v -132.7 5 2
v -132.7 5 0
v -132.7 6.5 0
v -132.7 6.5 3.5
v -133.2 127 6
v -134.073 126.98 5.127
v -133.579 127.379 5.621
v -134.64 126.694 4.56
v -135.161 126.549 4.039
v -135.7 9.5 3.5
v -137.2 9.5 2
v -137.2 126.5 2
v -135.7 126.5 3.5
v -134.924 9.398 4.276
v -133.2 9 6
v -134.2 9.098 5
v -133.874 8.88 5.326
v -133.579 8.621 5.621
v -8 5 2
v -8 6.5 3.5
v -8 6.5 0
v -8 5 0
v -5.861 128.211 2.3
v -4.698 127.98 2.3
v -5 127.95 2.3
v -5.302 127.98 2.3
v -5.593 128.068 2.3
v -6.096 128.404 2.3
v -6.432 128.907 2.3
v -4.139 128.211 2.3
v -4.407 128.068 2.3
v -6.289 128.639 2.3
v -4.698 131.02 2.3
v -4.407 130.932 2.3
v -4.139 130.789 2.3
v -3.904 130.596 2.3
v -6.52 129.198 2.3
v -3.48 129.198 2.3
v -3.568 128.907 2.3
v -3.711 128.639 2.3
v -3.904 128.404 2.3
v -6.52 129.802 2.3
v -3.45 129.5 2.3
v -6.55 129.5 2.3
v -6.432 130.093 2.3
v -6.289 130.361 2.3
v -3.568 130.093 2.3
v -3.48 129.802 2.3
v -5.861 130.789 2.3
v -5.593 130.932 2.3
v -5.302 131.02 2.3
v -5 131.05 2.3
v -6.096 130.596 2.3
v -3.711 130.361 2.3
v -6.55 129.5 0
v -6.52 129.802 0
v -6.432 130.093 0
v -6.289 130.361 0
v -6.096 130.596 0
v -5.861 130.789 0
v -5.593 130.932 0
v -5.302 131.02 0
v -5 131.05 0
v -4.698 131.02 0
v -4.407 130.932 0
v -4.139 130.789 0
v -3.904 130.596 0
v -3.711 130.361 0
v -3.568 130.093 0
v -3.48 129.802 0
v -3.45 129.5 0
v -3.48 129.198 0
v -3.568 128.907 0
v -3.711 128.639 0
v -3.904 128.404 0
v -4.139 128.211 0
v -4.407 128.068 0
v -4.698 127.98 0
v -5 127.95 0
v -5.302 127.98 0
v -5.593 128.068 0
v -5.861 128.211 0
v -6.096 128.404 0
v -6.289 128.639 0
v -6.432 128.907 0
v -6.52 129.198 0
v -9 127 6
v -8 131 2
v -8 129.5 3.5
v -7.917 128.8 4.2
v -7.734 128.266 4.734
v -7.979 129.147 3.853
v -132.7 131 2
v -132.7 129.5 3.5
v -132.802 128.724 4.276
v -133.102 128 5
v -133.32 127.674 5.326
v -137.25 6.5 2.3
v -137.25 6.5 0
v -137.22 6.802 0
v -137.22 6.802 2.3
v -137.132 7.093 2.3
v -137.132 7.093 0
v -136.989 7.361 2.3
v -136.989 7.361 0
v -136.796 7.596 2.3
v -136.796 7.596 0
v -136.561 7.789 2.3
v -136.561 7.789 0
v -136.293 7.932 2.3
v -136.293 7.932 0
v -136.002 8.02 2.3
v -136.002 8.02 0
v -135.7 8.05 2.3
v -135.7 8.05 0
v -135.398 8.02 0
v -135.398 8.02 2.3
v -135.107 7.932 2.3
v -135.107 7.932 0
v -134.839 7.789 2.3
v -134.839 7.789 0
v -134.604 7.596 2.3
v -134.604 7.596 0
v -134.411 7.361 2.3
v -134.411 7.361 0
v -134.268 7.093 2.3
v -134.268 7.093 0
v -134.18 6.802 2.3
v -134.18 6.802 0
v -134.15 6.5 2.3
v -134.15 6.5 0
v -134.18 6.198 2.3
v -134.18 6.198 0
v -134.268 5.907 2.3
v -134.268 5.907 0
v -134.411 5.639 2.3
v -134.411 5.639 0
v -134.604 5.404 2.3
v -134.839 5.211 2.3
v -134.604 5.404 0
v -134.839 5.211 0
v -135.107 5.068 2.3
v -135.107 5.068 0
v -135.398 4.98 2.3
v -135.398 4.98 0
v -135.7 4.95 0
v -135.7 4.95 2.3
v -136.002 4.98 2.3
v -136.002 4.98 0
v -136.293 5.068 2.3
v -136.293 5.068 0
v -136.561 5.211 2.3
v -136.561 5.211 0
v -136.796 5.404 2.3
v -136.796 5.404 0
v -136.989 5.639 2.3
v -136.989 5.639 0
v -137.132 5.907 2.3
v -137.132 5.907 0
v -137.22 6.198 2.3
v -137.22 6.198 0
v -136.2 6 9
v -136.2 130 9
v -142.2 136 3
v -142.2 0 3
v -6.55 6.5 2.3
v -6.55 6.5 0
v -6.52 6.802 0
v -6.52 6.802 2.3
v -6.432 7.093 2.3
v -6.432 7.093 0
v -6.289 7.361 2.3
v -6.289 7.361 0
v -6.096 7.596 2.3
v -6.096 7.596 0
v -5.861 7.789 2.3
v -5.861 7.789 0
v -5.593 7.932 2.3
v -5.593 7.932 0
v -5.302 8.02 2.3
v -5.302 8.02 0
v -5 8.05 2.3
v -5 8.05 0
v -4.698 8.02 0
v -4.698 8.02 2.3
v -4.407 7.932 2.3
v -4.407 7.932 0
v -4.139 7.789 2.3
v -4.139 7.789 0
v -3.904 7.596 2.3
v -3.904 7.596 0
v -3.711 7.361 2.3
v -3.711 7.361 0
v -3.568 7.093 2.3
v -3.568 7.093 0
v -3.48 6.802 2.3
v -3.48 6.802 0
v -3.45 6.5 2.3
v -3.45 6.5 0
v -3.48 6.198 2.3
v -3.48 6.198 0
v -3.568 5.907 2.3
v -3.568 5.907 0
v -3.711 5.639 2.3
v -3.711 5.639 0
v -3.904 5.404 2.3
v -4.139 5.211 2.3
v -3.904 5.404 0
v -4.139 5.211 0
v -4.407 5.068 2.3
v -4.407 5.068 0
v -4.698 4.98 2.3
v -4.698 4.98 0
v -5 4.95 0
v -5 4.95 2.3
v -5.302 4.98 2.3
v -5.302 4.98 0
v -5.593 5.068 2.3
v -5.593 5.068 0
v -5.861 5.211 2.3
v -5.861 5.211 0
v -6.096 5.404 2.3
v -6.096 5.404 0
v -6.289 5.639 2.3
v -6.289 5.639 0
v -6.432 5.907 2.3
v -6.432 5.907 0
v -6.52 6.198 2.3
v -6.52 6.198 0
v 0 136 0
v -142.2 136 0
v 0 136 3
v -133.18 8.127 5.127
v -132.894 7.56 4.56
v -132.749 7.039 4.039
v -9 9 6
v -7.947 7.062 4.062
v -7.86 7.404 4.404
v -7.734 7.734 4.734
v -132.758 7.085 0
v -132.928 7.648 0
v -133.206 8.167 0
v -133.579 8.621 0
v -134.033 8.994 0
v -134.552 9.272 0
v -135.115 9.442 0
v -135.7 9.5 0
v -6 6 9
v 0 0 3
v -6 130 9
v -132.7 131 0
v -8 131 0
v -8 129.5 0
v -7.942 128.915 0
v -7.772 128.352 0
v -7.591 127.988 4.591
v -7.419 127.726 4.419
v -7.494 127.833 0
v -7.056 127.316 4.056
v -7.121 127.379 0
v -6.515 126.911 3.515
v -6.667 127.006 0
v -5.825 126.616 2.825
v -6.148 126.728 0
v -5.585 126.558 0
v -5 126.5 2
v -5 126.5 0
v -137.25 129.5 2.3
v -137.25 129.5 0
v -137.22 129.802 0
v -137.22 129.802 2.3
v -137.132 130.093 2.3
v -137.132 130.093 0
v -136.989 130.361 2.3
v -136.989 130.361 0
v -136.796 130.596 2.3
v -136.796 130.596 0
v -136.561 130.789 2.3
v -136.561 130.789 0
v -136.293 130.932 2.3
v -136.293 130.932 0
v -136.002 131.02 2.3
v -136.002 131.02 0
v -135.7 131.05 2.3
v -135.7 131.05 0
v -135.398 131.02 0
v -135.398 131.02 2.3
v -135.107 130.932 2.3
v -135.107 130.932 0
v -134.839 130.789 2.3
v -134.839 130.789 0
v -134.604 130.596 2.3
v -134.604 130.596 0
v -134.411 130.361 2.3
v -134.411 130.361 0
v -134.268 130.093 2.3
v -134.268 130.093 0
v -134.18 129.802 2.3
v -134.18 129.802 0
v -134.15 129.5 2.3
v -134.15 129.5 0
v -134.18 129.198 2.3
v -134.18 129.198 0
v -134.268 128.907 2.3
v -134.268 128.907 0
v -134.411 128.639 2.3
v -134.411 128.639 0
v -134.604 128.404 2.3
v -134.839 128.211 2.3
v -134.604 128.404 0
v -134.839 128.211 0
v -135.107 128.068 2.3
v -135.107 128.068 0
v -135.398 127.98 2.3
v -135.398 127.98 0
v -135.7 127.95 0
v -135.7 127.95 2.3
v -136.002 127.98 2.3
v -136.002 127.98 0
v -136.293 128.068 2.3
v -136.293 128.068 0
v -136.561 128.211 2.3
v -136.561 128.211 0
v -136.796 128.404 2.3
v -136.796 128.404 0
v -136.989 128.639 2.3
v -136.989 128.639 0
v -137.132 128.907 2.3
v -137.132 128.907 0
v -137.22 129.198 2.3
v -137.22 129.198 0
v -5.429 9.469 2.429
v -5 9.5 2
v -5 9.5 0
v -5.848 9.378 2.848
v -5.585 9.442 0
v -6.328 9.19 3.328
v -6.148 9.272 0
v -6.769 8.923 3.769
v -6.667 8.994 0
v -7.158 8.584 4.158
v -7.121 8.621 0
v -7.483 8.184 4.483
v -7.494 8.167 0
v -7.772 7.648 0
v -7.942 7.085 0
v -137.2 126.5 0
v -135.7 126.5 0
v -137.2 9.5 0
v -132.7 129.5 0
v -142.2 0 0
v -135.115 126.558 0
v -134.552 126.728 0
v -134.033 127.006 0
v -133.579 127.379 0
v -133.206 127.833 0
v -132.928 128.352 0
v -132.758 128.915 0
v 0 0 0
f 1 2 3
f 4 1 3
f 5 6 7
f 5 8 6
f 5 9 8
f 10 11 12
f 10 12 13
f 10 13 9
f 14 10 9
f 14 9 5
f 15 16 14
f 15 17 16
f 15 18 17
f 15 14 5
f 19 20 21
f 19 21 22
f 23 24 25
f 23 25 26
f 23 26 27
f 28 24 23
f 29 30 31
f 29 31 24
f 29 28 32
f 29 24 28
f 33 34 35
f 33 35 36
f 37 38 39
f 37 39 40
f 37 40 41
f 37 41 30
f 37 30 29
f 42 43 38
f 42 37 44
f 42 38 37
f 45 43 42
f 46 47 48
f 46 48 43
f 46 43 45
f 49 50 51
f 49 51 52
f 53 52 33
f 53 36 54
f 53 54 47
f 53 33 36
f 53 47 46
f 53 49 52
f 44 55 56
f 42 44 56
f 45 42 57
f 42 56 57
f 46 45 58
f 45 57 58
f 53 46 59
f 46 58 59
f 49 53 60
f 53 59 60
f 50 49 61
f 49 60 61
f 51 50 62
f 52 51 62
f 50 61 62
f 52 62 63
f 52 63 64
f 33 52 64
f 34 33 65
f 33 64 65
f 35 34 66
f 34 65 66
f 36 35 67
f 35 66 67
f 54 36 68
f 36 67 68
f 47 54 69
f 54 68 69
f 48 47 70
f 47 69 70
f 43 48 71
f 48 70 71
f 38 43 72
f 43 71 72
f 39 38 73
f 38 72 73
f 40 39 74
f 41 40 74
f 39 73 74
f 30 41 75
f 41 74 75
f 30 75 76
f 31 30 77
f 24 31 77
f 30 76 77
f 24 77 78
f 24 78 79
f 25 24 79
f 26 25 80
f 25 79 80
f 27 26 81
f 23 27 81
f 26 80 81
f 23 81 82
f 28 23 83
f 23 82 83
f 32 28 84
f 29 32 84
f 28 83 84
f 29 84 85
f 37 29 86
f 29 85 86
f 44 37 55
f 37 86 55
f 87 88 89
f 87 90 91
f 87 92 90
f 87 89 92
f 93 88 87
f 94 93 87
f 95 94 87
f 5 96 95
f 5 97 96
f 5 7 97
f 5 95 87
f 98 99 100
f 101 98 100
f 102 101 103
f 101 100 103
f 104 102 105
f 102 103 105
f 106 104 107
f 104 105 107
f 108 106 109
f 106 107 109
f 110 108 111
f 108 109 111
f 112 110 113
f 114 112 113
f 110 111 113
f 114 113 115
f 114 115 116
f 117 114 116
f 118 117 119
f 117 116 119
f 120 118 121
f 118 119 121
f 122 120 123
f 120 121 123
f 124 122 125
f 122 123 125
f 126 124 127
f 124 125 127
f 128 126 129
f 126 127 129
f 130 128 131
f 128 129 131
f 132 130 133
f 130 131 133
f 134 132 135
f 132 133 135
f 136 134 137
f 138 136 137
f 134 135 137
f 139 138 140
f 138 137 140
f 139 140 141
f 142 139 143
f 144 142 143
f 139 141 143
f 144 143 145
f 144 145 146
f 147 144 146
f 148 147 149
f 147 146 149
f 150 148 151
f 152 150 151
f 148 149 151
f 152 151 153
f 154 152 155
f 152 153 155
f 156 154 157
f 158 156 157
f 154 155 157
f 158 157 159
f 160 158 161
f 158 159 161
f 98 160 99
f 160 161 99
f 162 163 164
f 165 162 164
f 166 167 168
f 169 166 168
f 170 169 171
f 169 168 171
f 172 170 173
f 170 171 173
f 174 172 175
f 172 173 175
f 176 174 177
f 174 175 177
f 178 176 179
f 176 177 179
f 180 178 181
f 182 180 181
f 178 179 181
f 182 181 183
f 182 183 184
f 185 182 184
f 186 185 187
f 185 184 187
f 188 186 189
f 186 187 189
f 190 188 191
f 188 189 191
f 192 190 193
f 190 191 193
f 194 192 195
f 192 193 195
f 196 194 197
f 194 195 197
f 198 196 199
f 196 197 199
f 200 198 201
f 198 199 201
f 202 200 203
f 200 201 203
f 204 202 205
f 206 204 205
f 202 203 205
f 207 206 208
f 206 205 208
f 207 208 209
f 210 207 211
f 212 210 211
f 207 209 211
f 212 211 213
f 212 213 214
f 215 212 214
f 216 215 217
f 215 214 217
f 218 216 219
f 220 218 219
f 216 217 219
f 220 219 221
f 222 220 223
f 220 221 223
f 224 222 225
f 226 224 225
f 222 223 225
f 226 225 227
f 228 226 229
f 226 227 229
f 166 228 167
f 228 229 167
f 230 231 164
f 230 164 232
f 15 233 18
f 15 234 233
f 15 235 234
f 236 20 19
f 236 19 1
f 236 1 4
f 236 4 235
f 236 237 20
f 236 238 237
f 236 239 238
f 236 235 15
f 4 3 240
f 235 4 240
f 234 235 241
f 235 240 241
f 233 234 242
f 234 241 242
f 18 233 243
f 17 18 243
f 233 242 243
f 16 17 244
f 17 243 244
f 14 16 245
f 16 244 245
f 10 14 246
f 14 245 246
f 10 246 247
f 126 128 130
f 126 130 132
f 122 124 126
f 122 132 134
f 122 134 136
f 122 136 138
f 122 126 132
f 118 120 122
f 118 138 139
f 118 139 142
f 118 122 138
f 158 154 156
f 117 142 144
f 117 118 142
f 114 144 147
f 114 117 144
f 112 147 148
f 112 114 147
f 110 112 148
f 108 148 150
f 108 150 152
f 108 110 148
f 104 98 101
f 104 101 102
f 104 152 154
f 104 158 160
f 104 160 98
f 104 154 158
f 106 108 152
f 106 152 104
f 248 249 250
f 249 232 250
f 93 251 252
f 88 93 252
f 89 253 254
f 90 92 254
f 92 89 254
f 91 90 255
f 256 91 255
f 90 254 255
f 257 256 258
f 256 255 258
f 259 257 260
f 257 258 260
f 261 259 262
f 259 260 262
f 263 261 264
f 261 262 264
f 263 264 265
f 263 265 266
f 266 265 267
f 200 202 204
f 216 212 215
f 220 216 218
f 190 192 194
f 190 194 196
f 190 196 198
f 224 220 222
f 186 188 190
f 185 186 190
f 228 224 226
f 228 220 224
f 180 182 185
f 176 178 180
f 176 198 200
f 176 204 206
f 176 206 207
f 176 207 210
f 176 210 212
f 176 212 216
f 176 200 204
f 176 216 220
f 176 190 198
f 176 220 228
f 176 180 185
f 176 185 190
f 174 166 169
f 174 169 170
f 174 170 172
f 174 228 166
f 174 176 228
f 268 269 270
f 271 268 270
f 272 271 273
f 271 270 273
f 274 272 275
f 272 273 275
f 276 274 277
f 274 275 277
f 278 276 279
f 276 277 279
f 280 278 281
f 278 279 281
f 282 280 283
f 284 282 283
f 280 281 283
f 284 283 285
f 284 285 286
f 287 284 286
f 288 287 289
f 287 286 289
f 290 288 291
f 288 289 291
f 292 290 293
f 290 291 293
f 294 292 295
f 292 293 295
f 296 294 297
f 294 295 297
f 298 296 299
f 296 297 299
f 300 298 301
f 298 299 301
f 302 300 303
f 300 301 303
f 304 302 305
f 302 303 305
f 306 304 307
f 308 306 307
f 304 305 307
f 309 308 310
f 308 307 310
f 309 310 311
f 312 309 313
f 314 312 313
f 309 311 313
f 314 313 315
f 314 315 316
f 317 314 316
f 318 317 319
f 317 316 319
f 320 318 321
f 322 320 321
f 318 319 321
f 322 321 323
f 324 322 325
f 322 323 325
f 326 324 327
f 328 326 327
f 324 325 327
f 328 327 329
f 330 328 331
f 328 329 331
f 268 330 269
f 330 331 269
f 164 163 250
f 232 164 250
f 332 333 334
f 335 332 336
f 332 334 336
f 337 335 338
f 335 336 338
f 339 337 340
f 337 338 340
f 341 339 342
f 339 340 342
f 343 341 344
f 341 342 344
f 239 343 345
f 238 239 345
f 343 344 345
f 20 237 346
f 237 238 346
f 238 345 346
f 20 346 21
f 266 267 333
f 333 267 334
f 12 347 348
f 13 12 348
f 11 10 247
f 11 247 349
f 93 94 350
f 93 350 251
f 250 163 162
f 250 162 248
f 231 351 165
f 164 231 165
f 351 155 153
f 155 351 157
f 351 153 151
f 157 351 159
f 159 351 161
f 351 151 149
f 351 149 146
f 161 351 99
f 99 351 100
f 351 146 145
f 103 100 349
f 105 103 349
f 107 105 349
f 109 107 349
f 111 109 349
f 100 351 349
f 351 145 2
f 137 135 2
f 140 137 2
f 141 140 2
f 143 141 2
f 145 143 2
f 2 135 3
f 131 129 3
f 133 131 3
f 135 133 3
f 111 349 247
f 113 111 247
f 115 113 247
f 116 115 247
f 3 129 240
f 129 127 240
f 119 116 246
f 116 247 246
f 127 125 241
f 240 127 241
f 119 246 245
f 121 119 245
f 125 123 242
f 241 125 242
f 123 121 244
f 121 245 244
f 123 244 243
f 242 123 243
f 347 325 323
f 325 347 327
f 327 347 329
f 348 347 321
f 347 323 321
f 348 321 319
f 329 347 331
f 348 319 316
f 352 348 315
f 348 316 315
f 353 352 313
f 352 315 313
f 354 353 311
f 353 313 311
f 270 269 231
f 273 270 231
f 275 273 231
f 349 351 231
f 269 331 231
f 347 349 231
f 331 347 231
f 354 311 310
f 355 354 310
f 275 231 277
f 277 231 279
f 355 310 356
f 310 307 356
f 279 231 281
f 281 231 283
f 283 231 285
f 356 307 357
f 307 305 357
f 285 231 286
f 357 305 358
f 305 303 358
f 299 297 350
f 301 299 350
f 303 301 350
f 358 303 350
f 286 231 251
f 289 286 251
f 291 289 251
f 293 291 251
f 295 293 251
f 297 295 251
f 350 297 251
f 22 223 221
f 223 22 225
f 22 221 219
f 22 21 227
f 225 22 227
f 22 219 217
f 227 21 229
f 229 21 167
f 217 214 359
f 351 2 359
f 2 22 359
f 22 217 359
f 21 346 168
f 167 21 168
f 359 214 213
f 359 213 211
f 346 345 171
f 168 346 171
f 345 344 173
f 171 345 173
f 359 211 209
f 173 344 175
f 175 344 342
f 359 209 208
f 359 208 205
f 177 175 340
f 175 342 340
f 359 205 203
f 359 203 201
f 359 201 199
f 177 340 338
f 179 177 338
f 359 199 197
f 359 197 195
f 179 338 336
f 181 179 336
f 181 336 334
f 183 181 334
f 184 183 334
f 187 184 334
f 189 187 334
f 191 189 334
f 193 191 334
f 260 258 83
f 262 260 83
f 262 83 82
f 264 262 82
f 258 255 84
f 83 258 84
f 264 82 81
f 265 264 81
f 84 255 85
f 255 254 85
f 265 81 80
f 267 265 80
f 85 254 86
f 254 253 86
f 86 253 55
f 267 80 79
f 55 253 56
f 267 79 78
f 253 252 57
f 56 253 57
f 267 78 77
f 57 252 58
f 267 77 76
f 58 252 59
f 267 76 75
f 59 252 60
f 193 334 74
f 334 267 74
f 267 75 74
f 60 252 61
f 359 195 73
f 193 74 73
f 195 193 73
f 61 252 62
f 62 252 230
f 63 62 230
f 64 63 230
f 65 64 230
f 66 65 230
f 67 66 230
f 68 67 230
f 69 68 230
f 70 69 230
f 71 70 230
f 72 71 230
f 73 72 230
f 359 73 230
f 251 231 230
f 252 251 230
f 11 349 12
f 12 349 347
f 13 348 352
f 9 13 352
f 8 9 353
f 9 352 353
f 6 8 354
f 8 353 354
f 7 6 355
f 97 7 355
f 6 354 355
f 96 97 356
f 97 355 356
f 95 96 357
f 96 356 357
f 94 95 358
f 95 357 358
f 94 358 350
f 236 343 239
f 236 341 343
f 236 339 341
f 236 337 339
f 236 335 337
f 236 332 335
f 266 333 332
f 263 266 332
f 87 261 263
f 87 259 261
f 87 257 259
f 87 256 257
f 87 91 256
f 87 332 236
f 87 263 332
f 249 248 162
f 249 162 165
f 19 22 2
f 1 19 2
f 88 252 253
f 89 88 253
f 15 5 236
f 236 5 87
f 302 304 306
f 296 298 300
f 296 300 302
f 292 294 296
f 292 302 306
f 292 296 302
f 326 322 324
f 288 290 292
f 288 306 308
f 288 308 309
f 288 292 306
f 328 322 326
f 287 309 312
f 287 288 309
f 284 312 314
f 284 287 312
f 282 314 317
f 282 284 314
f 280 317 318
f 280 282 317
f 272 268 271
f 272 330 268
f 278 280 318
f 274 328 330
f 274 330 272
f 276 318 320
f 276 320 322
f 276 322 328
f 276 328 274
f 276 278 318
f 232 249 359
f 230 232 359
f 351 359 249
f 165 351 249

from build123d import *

# Parameters (mm, degrees)
SKETCH1_W           = 142.2
SKETCH1_H           = 136
BOSS_EXTRUDE1_DEPTH = 6
SKETCH2_W           = 142.2
SKETCH2_H           = 136
BOSS_EXTRUDE2_DEPTH = 3
CHAMFER1_SIZE       = 6
CHAMFER2_SIZE       = 4
SKETCH3_R           = 1.55
CUT_EXTRUDE1_DEPTH  = 2.3


with BuildPart() as part:
    # Sketch1 → Boss-Extrude1 (new body)
    with BuildSketch(Plane.XY):
        with Locations((-71.1, 68)):
            Rectangle(SKETCH1_W, SKETCH1_H)
        with BuildLine():
            ThreePointArc((-5, 9.5), (-7.121320344, 8.621320344), (-8, 6.5))
            Line((-8, 6.5), (-8, 5))
            Line((-8, 5), (-132.7, 5))
            Line((-132.7, 5), (-132.7, 6.5))
            ThreePointArc((-132.7, 6.5), (-133.578679656, 8.621320344), (-135.7, 9.5))
            Line((-135.7, 9.5), (-137.2, 9.5))
            Line((-137.2, 9.5), (-137.2, 126.5))
            Line((-137.2, 126.5), (-135.7, 126.5))
            ThreePointArc((-135.7, 126.5), (-133.578679656, 127.378679656), (-132.7, 129.5))
            Line((-132.7, 129.5), (-132.7, 131))
            Line((-132.7, 131), (-8, 131))
            Line((-8, 131), (-8, 129.5))
            ThreePointArc((-8, 129.5), (-7.121320344, 127.378679656), (-5, 126.5))
            Line((-5, 126.5), (-5, 9.5))
        make_face(mode=Mode.SUBTRACT)
    extrude(amount=BOSS_EXTRUDE1_DEPTH)

    # Sketch2 → Boss-Extrude2 (add)
    with BuildSketch(Plane.XY.offset(6)):
        with Locations((-71.1, 68)):
            Rectangle(SKETCH2_W, SKETCH2_H)
    extrude(amount=BOSS_EXTRUDE2_DEPTH)

    # Chamfer1
    chamfer1_edges = [part.edges().sort_by_distance(p)[0] for p in [
        (-142.2, 68, 9),
        (-71.1, 0, 9),
        (0, 68, 9),
        (-71.1, 136, 9),
    ]]
    chamfer(chamfer1_edges, length=CHAMFER1_SIZE)

    # Chamfer2
    # the kernel refuses this chamfer: 4 mm, written as the material it adds along each edge
    with BuildSketch(Plane(origin=(-142.986731952, 131, 6), x_dir=(0, 0.02749587661058907, -0.9996219169112965), z_dir=(1, 0, 0))) as chamfer2_piece_1_section:
        Polygon((CHAMFER2_SIZE * 0.999621916911, -CHAMFER2_SIZE * 0.0274958766106), (-CHAMFER2_SIZE * 0.0274958766106, -CHAMFER2_SIZE * 0.999621916911), (0, 0), align=None)
    chamfer2_piece_1 = extrude(amount=145.273463904, mode=Mode.PRIVATE)
    chamfer2_piece_1 = split(chamfer2_piece_1, bisect_by=Plane(origin=(-142.2, 127.973585933, 5.513207057), z_dir=(1, 0, 0)), keep=Keep.TOP, mode=Mode.PRIVATE)
    chamfer2_piece_1 = split(chamfer2_piece_1, bisect_by=Plane(origin=(0, 127.973585933, 5.513207057), z_dir=(-1, 0, 0)), keep=Keep.TOP, mode=Mode.PRIVATE)
    chamfer2_piece_1 = split(chamfer2_piece_1, bisect_by=Plane(origin=(-136.314439618, 127.973585933, 8.885560382), z_dir=(0.7071067811865476, 0, -0.7071067811865476)), keep=Keep.TOP, mode=Mode.PRIVATE)
    chamfer2_piece_1 = split(chamfer2_piece_1, bisect_by=Plane(origin=(-67.727646674, 127.973585933, 70.727646674), z_dir=(-0.7071067811865476, 0, -0.7071067811865476)), keep=Keep.TOP, mode=Mode.PRIVATE)
    add(chamfer2_piece_1)
    with BuildSketch(Plane(origin=(-5, 136.786731952, 6), x_dir=(0.02749587661058627, 0, -0.9996219169112968), z_dir=(0, -1, 0))) as chamfer2_piece_2_section:
        Polygon((CHAMFER2_SIZE * 0.999621916911, -CHAMFER2_SIZE * 0.0274958766106), (-CHAMFER2_SIZE * 0.0274958766106, -CHAMFER2_SIZE * 0.999621916911), (0, 0), align=None)
    chamfer2_piece_2 = extrude(amount=137.573463904, mode=Mode.PRIVATE)
    chamfer2_piece_2 = split(chamfer2_piece_2, bisect_by=Plane(origin=(-8.333333333, 5, 5.666666667), z_dir=(0, 1, 0)), keep=Keep.TOP, mode=Mode.PRIVATE)
    chamfer2_piece_2 = split(chamfer2_piece_2, bisect_by=Plane(origin=(-8.333333333, 131, 5.666666667), z_dir=(0, -1, 0)), keep=Keep.TOP, mode=Mode.PRIVATE)
    add(chamfer2_piece_2)
    with BuildSketch(Plane(origin=(2.286731952, 5, 6), x_dir=(0, -0.02749587661058627, -0.9996219169112968), z_dir=(-1, 0, 0))) as chamfer2_piece_3_section:
        Polygon((CHAMFER2_SIZE * 0.999621916911, -CHAMFER2_SIZE * 0.0274958766106), (-CHAMFER2_SIZE * 0.0274958766106, -CHAMFER2_SIZE * 0.999621916911), (0, 0), align=None)
    chamfer2_piece_3 = extrude(amount=145.273463904, mode=Mode.PRIVATE)
    chamfer2_piece_3 = split(chamfer2_piece_3, bisect_by=Plane(origin=(-142.2, 8.026414067, 5.513207057), z_dir=(1, 0, 0)), keep=Keep.TOP, mode=Mode.PRIVATE)
    chamfer2_piece_3 = split(chamfer2_piece_3, bisect_by=Plane(origin=(0, 8.026414067, 5.513207057), z_dir=(-1, 0, 0)), keep=Keep.TOP, mode=Mode.PRIVATE)
    chamfer2_piece_3 = split(chamfer2_piece_3, bisect_by=Plane(origin=(-73.722353326, 8.026414067, 71.477646674), z_dir=(0.7071067811865476, 0, -0.7071067811865476)), keep=Keep.TOP, mode=Mode.PRIVATE)
    chamfer2_piece_3 = split(chamfer2_piece_3, bisect_by=Plane(origin=(-5.135560382, 8.026414067, 8.135560382), z_dir=(-0.7071067811865476, 0, -0.7071067811865476)), keep=Keep.TOP, mode=Mode.PRIVATE)
    add(chamfer2_piece_3)
    with BuildSketch(Plane(origin=(-137.2, -0.786731952, 6), x_dir=(-0.02749587661058907, 0, -0.9996219169112965), z_dir=(0, 1, 0))) as chamfer2_piece_4_section:
        Polygon((CHAMFER2_SIZE * 0.999621916911, -CHAMFER2_SIZE * 0.0274958766106), (-CHAMFER2_SIZE * 0.0274958766106, -CHAMFER2_SIZE * 0.999621916911), (0, 0), align=None)
    chamfer2_piece_4 = extrude(amount=137.573463904, mode=Mode.PRIVATE)
    chamfer2_piece_4 = split(chamfer2_piece_4, bisect_by=Plane(origin=(-134.173585933, 0, 5.513207057), z_dir=(0, 1, 0)), keep=Keep.TOP, mode=Mode.PRIVATE)
    chamfer2_piece_4 = split(chamfer2_piece_4, bisect_by=Plane(origin=(-134.173585933, 5.885560382, 8.885560382), z_dir=(0, 0.7071067811865476, -0.7071067811865476)), keep=Keep.TOP, mode=Mode.PRIVATE)
    chamfer2_piece_4 = split(chamfer2_piece_4, bisect_by=Plane(origin=(-134.173585933, 136, 5.513207057), z_dir=(0, -1, 0)), keep=Keep.TOP, mode=Mode.PRIVATE)
    chamfer2_piece_4 = split(chamfer2_piece_4, bisect_by=Plane(origin=(-134.173585933, 71.372353326, 67.627646674), z_dir=(0, -0.7071067811865476, -0.7071067811865476)), keep=Keep.TOP, mode=Mode.PRIVATE)
    add(chamfer2_piece_4)

    # Sketch3 → Cut-Extrude1 (cut)
    with BuildSketch(Plane(origin=(0, 0, 0), x_dir=(-1, 0, 0), z_dir=(0, 0, -1))):
        with Locations((135.7, 129.5)):
            Circle(SKETCH3_R)
        with Locations((135.7, 6.5)):
            Circle(SKETCH3_R)
        with Locations((5, 6.5)):
            Circle(SKETCH3_R)
        with Locations((5, 129.5)):
            Circle(SKETCH3_R)
    extrude(amount=-CUT_EXTRUDE1_DEPTH, mode=Mode.SUBTRACT)


solid = part.part
